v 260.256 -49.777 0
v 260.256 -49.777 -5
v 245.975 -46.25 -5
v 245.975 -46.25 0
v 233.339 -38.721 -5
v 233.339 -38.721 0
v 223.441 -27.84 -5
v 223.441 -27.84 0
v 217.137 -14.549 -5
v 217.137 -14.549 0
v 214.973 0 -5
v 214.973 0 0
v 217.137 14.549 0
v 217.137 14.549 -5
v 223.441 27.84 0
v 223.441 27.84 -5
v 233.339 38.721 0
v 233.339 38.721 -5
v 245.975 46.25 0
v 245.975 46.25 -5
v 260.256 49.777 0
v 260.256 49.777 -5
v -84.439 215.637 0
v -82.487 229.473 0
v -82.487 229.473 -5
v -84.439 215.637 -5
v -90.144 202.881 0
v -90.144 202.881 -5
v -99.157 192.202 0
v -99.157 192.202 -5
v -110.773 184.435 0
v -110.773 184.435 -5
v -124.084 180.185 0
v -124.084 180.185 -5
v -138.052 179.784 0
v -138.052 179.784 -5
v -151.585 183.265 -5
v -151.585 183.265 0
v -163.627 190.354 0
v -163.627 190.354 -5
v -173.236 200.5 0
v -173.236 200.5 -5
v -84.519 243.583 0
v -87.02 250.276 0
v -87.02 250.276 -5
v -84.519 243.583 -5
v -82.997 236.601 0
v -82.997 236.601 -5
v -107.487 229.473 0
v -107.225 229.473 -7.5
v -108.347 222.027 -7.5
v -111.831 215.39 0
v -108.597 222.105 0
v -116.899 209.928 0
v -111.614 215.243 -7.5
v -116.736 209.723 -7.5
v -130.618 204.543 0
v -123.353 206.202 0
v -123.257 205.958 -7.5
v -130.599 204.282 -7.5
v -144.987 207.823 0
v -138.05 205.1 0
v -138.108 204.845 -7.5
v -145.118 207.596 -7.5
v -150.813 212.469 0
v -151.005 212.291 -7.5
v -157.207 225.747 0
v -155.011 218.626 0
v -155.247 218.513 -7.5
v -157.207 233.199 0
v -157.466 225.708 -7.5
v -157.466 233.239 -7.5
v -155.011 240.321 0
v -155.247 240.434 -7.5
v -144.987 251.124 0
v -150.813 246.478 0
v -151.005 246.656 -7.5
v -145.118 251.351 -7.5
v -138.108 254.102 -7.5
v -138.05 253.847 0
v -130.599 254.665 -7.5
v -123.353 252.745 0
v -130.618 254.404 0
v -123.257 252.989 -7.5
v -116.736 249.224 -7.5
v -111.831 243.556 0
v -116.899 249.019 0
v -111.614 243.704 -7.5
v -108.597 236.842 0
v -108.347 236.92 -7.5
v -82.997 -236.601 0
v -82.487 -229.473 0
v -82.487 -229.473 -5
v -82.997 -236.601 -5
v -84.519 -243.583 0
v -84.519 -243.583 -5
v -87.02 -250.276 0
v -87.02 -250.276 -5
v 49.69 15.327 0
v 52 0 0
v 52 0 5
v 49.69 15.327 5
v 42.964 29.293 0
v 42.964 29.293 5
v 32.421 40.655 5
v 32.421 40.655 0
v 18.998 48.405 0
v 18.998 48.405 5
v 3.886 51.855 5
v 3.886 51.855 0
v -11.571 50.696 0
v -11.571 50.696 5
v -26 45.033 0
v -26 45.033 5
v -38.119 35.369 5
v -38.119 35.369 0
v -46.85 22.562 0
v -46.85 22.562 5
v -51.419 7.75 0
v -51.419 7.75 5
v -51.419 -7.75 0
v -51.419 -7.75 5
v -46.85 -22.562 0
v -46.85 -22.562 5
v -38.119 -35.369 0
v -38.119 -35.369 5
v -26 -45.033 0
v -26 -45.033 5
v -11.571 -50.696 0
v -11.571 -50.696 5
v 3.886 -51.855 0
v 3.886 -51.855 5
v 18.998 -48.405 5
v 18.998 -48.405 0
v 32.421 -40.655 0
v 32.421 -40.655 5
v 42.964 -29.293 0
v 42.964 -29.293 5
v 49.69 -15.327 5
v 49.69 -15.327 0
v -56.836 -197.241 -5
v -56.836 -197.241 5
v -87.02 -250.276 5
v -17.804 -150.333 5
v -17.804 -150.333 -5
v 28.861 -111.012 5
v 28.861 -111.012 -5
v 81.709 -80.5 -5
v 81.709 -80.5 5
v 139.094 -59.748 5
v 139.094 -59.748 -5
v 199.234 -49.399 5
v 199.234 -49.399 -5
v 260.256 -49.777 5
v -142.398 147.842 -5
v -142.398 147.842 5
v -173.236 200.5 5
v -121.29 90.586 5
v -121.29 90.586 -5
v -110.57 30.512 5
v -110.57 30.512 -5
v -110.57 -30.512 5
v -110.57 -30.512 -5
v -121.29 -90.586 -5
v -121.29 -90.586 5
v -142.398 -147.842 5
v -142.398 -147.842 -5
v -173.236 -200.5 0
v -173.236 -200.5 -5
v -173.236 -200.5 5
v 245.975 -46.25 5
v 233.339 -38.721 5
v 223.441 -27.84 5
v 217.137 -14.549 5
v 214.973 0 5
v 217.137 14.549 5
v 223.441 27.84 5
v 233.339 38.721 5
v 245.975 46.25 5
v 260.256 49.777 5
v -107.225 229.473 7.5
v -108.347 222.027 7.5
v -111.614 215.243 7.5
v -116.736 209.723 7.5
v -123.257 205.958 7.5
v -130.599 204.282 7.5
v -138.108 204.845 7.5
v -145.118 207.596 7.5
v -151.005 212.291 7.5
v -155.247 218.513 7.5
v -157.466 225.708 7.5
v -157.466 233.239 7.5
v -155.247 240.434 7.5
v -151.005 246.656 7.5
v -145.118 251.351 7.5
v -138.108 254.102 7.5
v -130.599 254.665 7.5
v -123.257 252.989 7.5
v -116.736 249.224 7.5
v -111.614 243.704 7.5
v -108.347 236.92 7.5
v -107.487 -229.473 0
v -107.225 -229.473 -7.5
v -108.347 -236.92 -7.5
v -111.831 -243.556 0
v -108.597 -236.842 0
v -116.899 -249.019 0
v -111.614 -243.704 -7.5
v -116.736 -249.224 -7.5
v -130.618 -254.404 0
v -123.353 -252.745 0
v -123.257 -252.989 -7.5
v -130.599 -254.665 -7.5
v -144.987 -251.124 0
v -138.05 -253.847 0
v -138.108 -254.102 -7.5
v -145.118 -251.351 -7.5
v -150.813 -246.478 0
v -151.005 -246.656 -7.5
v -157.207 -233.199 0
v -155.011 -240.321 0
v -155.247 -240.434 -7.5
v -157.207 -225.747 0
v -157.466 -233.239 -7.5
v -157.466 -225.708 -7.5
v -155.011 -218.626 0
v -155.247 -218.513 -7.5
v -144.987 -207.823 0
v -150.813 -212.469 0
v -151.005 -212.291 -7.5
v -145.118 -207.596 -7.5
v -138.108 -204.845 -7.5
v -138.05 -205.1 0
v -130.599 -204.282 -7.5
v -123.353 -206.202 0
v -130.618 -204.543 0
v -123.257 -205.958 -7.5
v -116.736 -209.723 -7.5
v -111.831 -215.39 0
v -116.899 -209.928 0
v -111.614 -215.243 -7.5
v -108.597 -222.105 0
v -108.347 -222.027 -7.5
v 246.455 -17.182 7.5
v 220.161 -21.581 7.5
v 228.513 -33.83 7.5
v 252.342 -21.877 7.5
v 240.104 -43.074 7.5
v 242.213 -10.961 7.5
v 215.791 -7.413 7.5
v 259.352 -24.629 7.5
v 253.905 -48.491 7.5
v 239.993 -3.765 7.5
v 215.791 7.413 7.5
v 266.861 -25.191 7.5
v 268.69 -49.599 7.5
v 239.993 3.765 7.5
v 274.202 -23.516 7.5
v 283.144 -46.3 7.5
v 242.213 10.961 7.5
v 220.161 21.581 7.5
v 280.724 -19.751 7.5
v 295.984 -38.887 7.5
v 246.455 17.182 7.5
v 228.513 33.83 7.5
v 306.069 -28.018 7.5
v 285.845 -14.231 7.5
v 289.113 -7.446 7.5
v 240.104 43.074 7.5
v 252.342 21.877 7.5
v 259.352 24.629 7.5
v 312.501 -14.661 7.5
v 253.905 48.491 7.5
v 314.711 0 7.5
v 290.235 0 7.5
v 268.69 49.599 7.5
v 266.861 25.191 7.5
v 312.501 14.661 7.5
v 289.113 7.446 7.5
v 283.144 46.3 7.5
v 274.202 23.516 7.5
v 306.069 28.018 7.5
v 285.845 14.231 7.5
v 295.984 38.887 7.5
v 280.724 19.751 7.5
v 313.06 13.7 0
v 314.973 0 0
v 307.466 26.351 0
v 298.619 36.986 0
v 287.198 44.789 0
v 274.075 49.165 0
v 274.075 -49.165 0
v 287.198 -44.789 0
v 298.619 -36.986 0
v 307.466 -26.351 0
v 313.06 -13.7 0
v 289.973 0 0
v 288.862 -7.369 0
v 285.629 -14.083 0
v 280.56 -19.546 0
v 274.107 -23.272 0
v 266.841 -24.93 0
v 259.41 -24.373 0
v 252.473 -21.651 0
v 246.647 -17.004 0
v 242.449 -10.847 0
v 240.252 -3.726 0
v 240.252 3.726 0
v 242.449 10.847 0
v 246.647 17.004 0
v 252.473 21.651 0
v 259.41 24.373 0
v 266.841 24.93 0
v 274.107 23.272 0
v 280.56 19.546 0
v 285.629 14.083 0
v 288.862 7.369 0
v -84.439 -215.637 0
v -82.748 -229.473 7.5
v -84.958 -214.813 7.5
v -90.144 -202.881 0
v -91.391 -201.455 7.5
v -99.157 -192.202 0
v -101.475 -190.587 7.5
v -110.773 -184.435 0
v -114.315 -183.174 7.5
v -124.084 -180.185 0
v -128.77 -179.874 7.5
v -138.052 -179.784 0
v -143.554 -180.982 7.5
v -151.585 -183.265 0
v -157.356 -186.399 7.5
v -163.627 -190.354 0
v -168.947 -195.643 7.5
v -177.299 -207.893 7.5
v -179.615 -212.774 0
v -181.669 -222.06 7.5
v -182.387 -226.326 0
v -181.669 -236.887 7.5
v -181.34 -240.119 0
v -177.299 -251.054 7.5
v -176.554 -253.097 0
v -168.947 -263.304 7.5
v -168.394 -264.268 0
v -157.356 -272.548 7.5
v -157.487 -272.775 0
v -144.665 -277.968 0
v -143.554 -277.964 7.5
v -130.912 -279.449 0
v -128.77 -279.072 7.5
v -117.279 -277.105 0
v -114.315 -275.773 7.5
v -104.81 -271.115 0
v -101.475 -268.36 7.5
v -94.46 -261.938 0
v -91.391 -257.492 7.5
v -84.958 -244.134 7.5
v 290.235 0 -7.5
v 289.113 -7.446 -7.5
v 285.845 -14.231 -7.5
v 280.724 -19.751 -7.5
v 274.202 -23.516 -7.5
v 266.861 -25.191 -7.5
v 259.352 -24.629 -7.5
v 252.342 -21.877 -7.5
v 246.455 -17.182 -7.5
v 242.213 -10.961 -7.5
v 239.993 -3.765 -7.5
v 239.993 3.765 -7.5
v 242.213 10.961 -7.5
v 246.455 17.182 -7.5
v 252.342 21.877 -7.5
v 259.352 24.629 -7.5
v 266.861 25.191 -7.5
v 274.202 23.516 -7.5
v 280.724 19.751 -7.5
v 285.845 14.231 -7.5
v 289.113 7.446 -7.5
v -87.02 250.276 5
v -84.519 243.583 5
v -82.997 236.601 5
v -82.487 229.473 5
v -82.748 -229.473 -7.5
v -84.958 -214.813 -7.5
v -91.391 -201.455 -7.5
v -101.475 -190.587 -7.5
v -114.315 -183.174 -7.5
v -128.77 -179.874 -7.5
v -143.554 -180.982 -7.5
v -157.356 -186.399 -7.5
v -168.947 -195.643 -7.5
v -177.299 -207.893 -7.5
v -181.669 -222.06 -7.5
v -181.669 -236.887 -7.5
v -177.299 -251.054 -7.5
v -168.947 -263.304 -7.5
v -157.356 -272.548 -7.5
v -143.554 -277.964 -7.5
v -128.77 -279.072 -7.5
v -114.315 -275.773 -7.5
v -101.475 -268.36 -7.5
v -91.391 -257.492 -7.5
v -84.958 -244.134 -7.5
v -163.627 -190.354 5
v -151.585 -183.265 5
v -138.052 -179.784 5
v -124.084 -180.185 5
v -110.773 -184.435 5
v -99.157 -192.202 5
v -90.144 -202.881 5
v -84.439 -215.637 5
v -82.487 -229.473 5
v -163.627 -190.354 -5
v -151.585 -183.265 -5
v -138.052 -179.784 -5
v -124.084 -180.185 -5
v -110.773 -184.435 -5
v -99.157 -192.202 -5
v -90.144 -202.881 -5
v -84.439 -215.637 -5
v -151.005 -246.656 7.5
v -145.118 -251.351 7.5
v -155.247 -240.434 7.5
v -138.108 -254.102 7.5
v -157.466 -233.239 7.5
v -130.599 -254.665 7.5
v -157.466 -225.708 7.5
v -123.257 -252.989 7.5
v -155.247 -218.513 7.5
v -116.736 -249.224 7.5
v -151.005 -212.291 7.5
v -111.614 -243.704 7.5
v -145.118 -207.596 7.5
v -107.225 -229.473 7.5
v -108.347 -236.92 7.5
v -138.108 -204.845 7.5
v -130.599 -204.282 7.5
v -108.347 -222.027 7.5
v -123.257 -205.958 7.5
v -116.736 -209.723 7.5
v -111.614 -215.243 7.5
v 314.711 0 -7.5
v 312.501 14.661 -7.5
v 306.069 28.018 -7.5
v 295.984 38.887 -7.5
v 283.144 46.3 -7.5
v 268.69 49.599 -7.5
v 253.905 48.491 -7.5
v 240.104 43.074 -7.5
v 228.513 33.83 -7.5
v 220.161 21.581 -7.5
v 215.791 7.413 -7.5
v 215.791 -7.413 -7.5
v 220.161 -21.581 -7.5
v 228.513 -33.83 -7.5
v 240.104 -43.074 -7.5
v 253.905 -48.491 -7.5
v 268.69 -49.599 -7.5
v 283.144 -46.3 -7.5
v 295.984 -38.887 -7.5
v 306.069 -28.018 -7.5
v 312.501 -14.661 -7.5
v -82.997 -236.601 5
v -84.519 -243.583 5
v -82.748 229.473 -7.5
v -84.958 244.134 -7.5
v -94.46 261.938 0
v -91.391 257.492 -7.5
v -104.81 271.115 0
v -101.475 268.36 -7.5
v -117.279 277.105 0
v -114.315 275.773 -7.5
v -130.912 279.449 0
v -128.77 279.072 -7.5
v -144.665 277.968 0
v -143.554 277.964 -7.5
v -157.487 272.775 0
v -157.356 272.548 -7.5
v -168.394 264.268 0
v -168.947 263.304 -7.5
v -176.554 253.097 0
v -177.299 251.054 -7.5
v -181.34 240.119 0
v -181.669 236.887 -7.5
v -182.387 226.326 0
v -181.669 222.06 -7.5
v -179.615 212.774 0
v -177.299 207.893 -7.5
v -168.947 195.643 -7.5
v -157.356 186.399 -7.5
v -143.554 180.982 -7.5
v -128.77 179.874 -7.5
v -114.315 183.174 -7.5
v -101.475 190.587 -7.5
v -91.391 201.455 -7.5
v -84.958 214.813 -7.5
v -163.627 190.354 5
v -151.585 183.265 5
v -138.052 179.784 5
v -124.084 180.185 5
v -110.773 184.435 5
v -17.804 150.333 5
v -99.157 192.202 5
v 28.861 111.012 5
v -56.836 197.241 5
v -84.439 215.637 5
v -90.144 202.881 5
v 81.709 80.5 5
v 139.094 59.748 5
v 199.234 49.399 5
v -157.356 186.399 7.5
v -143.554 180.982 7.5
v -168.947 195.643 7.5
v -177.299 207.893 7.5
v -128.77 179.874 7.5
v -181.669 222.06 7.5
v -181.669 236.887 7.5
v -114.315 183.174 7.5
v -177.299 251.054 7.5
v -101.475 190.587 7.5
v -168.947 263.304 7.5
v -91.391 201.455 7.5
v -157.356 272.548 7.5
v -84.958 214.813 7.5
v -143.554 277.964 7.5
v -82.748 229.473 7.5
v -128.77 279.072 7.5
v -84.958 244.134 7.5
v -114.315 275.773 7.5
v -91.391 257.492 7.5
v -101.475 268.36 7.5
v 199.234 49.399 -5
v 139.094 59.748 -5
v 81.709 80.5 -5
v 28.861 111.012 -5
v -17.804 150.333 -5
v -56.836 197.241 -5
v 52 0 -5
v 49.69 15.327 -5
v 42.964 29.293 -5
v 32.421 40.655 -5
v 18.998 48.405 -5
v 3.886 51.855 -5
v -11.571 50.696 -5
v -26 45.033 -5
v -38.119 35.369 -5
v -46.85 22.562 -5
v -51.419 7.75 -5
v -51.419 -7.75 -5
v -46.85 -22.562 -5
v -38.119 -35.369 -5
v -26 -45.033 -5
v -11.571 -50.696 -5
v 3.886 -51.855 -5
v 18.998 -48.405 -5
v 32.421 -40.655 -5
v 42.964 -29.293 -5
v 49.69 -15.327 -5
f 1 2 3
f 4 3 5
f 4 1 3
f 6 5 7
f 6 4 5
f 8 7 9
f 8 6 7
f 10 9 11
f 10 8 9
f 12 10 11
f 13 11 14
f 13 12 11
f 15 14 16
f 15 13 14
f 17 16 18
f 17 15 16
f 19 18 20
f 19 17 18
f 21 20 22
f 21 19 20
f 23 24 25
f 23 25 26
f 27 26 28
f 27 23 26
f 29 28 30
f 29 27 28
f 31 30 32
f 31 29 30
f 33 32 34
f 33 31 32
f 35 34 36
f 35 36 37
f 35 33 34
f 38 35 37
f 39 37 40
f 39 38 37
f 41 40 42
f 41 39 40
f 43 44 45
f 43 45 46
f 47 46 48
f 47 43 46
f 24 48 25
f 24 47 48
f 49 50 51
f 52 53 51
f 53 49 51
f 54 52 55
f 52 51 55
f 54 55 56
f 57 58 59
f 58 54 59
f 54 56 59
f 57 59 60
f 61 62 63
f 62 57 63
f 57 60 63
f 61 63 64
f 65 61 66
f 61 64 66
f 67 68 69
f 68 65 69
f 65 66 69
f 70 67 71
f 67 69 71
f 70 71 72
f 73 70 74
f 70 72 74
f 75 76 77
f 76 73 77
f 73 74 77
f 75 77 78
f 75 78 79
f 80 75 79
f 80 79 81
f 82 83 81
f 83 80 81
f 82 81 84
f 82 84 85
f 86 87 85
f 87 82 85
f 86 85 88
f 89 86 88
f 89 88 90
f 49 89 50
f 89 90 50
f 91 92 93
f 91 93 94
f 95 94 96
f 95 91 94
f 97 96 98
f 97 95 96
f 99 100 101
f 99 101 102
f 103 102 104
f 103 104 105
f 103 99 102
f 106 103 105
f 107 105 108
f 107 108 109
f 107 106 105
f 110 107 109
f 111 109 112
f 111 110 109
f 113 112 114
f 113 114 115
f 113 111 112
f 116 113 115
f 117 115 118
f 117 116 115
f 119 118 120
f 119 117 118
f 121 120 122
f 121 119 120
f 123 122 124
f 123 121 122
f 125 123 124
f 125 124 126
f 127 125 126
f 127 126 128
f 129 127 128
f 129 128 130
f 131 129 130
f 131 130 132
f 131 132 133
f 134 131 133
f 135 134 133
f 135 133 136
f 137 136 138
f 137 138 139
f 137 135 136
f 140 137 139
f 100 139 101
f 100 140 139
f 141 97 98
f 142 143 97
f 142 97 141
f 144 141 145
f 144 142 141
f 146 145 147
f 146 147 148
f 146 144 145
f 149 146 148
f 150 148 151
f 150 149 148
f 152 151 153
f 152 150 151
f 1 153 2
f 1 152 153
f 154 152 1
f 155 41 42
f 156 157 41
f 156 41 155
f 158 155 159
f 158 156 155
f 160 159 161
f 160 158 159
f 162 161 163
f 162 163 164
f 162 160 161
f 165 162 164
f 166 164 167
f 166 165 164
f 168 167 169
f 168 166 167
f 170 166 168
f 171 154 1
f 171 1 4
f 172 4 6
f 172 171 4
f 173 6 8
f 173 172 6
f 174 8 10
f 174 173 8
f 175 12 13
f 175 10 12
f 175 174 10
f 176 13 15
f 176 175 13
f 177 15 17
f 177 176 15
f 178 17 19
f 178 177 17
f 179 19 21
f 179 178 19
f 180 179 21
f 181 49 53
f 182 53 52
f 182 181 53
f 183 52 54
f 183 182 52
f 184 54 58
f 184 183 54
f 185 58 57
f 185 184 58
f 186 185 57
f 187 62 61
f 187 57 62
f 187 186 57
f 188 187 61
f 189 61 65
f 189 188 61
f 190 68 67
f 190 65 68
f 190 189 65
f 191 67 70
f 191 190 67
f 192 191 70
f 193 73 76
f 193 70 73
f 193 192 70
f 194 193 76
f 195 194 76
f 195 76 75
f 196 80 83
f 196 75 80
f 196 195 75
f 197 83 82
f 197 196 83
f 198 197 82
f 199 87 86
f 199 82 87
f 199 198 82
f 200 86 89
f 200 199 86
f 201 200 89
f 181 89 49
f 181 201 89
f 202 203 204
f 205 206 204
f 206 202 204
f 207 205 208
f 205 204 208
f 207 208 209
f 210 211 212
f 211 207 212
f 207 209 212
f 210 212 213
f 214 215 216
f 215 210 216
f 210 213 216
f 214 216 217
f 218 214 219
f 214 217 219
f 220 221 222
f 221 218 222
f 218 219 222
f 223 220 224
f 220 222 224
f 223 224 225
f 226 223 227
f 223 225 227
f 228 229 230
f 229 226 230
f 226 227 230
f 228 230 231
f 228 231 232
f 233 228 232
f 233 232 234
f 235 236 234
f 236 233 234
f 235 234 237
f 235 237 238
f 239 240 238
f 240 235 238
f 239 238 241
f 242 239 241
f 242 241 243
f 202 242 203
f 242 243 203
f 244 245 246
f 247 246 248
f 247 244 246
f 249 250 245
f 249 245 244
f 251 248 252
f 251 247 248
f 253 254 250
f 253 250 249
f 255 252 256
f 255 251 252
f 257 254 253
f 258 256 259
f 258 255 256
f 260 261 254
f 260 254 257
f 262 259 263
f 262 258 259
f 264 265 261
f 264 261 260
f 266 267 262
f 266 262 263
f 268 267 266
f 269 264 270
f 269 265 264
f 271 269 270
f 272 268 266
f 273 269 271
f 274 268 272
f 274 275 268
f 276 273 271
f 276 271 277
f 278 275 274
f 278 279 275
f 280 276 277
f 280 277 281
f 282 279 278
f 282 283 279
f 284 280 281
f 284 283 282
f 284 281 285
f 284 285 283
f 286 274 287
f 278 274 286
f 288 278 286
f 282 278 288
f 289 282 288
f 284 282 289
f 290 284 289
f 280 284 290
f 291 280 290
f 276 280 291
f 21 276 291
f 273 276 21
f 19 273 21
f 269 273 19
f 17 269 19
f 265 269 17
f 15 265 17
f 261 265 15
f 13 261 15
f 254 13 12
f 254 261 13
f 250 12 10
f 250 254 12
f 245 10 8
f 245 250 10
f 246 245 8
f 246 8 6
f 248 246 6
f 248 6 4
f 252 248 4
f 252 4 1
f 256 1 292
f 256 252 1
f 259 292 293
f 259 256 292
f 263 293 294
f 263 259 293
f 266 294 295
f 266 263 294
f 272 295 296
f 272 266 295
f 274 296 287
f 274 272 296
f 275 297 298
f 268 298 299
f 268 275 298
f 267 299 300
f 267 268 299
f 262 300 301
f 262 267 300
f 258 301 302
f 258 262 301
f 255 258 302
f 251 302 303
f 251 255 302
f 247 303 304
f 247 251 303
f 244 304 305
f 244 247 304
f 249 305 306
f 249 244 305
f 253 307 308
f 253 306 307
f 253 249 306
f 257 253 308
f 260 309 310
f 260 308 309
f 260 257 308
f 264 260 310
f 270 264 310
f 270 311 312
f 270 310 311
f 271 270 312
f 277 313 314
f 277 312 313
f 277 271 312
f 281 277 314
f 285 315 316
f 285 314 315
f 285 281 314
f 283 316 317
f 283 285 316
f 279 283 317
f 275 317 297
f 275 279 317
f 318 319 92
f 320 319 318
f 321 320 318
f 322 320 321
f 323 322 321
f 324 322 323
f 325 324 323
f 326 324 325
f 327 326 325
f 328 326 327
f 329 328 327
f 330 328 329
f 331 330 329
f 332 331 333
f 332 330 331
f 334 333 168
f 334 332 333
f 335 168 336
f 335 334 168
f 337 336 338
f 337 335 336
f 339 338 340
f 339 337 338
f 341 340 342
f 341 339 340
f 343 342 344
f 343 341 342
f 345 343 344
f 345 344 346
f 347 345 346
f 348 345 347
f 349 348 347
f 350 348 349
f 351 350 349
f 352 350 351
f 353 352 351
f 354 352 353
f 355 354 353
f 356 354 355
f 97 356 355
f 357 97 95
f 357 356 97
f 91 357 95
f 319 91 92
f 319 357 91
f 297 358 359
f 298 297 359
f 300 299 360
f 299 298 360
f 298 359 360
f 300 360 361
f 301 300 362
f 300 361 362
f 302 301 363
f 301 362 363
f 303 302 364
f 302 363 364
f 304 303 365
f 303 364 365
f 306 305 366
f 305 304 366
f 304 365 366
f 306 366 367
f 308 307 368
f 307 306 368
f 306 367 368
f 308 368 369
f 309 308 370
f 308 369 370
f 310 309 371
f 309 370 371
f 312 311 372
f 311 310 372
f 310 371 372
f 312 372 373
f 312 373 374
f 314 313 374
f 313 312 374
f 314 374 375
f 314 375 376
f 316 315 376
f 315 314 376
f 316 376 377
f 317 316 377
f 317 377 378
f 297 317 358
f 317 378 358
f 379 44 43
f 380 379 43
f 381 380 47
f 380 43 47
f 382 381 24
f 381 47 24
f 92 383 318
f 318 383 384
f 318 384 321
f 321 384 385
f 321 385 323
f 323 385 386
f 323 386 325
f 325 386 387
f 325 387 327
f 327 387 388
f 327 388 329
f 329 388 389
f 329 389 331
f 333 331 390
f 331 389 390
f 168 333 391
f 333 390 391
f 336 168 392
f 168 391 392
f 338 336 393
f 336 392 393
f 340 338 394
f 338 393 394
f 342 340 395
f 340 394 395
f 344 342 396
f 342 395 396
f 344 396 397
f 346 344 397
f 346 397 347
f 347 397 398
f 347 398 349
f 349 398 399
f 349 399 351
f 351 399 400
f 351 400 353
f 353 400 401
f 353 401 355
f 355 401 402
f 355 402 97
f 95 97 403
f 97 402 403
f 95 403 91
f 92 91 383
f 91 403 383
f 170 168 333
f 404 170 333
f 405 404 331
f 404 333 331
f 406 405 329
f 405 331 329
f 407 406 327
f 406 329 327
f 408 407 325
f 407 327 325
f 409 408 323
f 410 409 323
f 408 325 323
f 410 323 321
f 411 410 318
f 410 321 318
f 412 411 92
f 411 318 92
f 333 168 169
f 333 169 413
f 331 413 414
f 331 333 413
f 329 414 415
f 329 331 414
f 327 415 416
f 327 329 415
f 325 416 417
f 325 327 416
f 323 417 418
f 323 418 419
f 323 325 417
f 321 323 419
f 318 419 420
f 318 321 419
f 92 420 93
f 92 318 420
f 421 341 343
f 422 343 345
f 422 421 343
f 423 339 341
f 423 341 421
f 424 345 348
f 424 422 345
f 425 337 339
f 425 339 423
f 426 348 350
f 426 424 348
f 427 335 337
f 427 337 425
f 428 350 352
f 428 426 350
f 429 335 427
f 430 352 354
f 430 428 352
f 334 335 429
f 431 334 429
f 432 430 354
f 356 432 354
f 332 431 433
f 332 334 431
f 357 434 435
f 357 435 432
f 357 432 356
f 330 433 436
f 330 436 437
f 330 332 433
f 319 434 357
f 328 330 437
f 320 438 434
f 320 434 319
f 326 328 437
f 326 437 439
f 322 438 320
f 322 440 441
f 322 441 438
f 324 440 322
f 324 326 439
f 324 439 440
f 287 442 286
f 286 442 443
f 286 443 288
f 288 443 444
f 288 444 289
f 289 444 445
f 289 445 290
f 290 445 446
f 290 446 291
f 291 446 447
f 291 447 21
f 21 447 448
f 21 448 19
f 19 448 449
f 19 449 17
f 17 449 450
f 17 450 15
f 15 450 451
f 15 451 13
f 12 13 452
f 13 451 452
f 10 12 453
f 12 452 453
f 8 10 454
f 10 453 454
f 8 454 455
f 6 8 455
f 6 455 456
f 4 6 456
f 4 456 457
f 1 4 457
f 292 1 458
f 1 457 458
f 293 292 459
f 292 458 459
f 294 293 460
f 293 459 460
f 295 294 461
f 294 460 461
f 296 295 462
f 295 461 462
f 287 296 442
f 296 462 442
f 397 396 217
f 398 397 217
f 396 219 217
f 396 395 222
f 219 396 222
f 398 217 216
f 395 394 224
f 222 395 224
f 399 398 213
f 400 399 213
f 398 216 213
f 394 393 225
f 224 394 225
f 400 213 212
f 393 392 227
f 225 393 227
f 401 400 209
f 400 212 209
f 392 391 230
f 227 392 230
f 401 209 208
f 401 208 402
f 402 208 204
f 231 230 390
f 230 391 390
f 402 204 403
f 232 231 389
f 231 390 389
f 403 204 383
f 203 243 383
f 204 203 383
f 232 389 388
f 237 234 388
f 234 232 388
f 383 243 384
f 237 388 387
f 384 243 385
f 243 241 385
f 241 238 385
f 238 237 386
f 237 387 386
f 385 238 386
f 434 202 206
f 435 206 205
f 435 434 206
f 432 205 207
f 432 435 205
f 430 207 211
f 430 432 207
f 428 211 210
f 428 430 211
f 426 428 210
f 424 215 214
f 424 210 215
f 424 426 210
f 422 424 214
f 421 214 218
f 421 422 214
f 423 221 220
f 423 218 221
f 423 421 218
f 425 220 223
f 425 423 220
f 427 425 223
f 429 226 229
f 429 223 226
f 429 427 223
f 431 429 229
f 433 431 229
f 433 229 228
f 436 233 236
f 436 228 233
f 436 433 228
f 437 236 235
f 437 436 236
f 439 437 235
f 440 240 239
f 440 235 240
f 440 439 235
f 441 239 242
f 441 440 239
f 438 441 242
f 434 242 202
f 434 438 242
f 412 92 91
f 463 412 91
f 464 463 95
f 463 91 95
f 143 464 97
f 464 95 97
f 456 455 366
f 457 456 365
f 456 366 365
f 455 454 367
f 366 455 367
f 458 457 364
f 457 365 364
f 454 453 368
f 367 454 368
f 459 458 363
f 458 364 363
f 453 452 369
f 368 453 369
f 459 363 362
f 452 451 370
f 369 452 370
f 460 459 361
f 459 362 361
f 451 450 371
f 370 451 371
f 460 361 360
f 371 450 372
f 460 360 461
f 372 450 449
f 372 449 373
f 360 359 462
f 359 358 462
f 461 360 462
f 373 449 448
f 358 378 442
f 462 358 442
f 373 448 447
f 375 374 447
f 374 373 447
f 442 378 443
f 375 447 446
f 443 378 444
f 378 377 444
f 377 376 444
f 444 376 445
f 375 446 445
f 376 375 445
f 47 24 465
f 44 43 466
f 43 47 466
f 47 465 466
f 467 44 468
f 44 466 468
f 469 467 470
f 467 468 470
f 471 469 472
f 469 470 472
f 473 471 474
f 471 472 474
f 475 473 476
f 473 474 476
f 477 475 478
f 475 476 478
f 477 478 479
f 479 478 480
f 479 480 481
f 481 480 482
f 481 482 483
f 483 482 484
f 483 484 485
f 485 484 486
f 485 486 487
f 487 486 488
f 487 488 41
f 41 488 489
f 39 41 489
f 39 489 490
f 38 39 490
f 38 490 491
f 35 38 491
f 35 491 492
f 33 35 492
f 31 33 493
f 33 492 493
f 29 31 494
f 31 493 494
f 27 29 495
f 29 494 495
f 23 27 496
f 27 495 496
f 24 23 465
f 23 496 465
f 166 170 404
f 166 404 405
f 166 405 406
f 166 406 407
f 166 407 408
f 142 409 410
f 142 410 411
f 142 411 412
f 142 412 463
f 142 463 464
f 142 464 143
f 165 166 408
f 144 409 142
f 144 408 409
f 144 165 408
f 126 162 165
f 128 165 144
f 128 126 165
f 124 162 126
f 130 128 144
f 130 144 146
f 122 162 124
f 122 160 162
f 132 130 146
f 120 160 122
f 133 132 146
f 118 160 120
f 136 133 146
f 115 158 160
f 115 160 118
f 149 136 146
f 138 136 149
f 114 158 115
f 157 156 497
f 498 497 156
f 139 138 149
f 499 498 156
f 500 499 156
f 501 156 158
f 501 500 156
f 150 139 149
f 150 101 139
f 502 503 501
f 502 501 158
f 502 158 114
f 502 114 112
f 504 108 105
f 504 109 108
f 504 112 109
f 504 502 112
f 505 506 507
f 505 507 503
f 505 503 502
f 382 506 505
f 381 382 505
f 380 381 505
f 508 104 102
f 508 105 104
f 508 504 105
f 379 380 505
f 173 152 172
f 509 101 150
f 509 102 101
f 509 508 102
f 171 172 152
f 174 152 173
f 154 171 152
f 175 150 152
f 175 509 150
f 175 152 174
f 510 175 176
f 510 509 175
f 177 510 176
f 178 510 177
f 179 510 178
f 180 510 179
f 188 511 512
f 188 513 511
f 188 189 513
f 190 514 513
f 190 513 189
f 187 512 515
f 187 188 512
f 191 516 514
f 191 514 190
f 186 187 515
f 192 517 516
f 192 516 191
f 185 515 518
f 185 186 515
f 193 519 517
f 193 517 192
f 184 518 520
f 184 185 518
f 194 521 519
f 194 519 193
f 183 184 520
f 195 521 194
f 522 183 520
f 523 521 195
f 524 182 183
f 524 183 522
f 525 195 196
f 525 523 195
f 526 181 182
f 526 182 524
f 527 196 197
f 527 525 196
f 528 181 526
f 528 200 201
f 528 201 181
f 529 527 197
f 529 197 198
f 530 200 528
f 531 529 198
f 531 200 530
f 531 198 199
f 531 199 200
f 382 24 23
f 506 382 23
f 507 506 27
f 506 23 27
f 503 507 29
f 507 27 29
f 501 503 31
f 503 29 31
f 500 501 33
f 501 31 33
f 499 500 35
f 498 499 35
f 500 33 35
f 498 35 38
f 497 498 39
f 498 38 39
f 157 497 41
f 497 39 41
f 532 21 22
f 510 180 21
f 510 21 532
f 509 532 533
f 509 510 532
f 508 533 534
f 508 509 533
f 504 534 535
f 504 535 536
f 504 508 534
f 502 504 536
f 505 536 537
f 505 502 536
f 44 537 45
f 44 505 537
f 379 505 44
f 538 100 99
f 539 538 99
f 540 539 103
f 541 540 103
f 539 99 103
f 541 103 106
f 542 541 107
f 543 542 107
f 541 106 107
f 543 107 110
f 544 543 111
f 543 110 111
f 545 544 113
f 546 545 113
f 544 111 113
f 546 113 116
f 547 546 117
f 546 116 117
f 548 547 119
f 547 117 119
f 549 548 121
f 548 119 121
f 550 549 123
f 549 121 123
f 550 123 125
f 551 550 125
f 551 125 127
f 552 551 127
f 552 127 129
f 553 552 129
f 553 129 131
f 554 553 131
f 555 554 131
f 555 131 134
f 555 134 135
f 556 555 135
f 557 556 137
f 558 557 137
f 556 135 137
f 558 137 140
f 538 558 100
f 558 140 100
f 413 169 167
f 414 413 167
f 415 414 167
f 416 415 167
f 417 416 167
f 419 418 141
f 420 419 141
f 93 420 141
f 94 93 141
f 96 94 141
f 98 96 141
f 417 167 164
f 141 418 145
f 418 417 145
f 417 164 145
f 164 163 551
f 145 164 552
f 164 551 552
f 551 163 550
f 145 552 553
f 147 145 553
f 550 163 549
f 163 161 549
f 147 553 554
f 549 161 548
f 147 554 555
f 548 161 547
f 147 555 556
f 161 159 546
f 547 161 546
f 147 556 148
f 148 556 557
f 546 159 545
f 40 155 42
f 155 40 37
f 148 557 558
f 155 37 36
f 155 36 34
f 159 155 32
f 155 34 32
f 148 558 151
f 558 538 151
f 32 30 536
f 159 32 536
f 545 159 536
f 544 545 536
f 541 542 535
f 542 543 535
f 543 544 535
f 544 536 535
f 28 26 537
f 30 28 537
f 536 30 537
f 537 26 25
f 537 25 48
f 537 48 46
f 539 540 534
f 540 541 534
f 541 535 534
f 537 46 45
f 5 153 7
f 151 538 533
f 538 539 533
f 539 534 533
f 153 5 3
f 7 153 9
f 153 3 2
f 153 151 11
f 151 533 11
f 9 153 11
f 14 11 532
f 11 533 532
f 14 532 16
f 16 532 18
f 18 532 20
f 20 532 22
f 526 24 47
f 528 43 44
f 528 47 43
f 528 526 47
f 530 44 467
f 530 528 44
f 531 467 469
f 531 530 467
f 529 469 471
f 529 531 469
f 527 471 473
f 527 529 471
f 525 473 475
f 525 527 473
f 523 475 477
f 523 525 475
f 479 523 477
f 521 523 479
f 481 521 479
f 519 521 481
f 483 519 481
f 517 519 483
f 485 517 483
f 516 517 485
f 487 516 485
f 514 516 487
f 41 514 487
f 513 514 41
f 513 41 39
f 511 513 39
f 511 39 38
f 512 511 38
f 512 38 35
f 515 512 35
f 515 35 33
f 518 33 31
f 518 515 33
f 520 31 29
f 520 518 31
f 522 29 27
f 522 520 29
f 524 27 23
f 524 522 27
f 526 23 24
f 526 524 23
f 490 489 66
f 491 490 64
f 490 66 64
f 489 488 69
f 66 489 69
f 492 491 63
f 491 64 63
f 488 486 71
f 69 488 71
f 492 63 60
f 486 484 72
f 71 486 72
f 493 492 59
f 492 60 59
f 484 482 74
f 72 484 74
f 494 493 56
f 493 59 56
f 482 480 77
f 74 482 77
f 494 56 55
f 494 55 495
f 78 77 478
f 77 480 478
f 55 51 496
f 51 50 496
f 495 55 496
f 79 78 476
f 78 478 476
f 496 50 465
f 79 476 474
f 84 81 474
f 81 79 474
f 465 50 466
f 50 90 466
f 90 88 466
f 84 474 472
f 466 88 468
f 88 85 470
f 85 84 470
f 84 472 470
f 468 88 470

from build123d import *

# Parameters (mm, degrees)
SKETCH1_R                     = 52
BOSS_EXTRUDE1_DEPTH           = 5
SKETCH1_3_R                   = 50
SKETCH1_3_R_2                 = 25
BOSS_EXTRUDE2_DEPTH           = 7.5
BOSS_EXTRUDE2_TAPER           = 2
BOSS_EXTRUDE2_OTHER_WAY_DEPTH = 7.5
BOSS_EXTRUDE2_OTHER_WAY_TAPER = 2


with BuildPart() as part:
    # Sketch1 → Boss-Extrude1 (new, symmetric)
    with BuildSketch(Plane.XY):
        with BuildLine():
            ThreePointArc((260.255645268, -49.776958244), (214.973105174, 0), (260.255645268, 49.776958244))
            ThreePointArc((260.255645268, 49.776958244), (54.610822714, 94.588719583), (-87.019712271, 250.276479402))
            ThreePointArc((-87.019712271, 250.276479402), (-83.632985595, 240.119049454), (-82.486552587, 229.473440401))
            ThreePointArc((-82.486552587, 229.473440401), (-117.279136969, 181.842205793), (-173.235932996, 200.499521158))
            ThreePointArc((-173.235932996, 200.499521158), (-109.221645428, 0), (-173.235932996, -200.499521158))
            ThreePointArc((-173.235932996, -200.499521158), (-117.279136969, -181.842205793), (-82.486552587, -229.473440401))
            ThreePointArc((-82.486552587, -229.473440401), (-83.632985595, -240.119049454), (-87.019712271, -250.276479402))
            ThreePointArc((-87.019712271, -250.276479402), (54.610822714, -94.588719583), (260.255645268, -49.776958244))
        make_face()
        Circle(SKETCH1_R, mode=Mode.SUBTRACT)
    extrude(amount=BOSS_EXTRUDE1_DEPTH, both=True)



with BuildPart() as body_2:
    # Sketch1<3> → Boss-Extrude2 (new body)
    # profile 1 of 3: a face of its own
    with BuildSketch(Plane.XY):
        with Locations((-132.486552587, 229.473440401)):
            Circle(SKETCH1_3_R)
        with Locations((-132.486552587, 229.473440401)):
            Circle(SKETCH1_3_R_2, mode=Mode.SUBTRACT)
    # profile 2 of 3: a face of its own
    with BuildSketch(Plane.XY):
        with Locations((-132.486552587, -229.473440401)):
            Circle(SKETCH1_3_R)
        with Locations((-132.486552587, -229.473440401)):
            Circle(SKETCH1_3_R_2, mode=Mode.SUBTRACT)
    # profile 3 of 3: a face of its own
    with BuildSketch(Plane.XY):
        with Locations((264.973105174, 0)):
            Circle(SKETCH1_3_R)
        with Locations((264.973105174, 0)):
            Circle(SKETCH1_3_R_2, mode=Mode.SUBTRACT)
    extrude(amount=BOSS_EXTRUDE2_DEPTH, taper=BOSS_EXTRUDE2_TAPER)


with BuildPart() as part_1:
    add(part.part)

    add(body_2.part)  # Boss-Extrude2 other way merges body 2
    # Sketch1<3> → Boss-Extrude2 other way (add)
    # profile 1 of 3: a face of its own
    with BuildSketch(Plane.XY):
        with Locations((-132.486552587, 229.473440401)):
            Circle(SKETCH1_3_R)
        with Locations((-132.486552587, 229.473440401)):
            Circle(SKETCH1_3_R_2, mode=Mode.SUBTRACT)
    # profile 2 of 3: a face of its own
    with BuildSketch(Plane.XY):
        with Locations((-132.486552587, -229.473440401)):
            Circle(SKETCH1_3_R)
        with Locations((-132.486552587, -229.473440401)):
            Circle(SKETCH1_3_R_2, mode=Mode.SUBTRACT)
    # profile 3 of 3: a face of its own
    with BuildSketch(Plane.XY):
        with Locations((264.973105174, 0)):
            Circle(SKETCH1_3_R)
        with Locations((264.973105174, 0)):
            Circle(SKETCH1_3_R_2, mode=Mode.SUBTRACT)
    extrude(amount=-BOSS_EXTRUDE2_OTHER_WAY_DEPTH, taper=BOSS_EXTRUDE2_OTHER_WAY_TAPER)


solid = part_1.part
